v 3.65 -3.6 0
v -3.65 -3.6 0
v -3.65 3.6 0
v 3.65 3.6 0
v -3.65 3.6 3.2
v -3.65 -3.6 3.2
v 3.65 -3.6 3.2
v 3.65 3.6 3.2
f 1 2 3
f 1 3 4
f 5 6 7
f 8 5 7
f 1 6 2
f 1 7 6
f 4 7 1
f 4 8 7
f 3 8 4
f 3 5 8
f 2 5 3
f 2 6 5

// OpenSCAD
// Datheet: https://www.tme.eu/Document/d1f8b47d020ebf11f3b92c6891638dfa/de.pdf

CHASSIS_X_LENGTH = 7.3;
CHASSIS_Y_LENGTH = 7.2;
CHASSIS_Z_LENGTH = 3.2;

// Increase steps in render to have quality circles
$fs=0.01;


module Screw() {
    translate([0,0,SCREW_RADIUS])
        rotate([270, 0])
            linear_extrude(height = SOCKET_LENGTH, convexity = 10, twist = 0)
                circle(SCREW_RADIUS);
}

module Isolator() {
    translate([-CHASSIS_X_LENGTH/2, -CHASSIS_Y_LENGTH/2,0])
    linear_extrude(height = CHASSIS_Z_LENGTH, convexity = 10, twist = 0)
        square([CHASSIS_X_LENGTH,CHASSIS_Y_LENGTH]);
}

Isolator();
